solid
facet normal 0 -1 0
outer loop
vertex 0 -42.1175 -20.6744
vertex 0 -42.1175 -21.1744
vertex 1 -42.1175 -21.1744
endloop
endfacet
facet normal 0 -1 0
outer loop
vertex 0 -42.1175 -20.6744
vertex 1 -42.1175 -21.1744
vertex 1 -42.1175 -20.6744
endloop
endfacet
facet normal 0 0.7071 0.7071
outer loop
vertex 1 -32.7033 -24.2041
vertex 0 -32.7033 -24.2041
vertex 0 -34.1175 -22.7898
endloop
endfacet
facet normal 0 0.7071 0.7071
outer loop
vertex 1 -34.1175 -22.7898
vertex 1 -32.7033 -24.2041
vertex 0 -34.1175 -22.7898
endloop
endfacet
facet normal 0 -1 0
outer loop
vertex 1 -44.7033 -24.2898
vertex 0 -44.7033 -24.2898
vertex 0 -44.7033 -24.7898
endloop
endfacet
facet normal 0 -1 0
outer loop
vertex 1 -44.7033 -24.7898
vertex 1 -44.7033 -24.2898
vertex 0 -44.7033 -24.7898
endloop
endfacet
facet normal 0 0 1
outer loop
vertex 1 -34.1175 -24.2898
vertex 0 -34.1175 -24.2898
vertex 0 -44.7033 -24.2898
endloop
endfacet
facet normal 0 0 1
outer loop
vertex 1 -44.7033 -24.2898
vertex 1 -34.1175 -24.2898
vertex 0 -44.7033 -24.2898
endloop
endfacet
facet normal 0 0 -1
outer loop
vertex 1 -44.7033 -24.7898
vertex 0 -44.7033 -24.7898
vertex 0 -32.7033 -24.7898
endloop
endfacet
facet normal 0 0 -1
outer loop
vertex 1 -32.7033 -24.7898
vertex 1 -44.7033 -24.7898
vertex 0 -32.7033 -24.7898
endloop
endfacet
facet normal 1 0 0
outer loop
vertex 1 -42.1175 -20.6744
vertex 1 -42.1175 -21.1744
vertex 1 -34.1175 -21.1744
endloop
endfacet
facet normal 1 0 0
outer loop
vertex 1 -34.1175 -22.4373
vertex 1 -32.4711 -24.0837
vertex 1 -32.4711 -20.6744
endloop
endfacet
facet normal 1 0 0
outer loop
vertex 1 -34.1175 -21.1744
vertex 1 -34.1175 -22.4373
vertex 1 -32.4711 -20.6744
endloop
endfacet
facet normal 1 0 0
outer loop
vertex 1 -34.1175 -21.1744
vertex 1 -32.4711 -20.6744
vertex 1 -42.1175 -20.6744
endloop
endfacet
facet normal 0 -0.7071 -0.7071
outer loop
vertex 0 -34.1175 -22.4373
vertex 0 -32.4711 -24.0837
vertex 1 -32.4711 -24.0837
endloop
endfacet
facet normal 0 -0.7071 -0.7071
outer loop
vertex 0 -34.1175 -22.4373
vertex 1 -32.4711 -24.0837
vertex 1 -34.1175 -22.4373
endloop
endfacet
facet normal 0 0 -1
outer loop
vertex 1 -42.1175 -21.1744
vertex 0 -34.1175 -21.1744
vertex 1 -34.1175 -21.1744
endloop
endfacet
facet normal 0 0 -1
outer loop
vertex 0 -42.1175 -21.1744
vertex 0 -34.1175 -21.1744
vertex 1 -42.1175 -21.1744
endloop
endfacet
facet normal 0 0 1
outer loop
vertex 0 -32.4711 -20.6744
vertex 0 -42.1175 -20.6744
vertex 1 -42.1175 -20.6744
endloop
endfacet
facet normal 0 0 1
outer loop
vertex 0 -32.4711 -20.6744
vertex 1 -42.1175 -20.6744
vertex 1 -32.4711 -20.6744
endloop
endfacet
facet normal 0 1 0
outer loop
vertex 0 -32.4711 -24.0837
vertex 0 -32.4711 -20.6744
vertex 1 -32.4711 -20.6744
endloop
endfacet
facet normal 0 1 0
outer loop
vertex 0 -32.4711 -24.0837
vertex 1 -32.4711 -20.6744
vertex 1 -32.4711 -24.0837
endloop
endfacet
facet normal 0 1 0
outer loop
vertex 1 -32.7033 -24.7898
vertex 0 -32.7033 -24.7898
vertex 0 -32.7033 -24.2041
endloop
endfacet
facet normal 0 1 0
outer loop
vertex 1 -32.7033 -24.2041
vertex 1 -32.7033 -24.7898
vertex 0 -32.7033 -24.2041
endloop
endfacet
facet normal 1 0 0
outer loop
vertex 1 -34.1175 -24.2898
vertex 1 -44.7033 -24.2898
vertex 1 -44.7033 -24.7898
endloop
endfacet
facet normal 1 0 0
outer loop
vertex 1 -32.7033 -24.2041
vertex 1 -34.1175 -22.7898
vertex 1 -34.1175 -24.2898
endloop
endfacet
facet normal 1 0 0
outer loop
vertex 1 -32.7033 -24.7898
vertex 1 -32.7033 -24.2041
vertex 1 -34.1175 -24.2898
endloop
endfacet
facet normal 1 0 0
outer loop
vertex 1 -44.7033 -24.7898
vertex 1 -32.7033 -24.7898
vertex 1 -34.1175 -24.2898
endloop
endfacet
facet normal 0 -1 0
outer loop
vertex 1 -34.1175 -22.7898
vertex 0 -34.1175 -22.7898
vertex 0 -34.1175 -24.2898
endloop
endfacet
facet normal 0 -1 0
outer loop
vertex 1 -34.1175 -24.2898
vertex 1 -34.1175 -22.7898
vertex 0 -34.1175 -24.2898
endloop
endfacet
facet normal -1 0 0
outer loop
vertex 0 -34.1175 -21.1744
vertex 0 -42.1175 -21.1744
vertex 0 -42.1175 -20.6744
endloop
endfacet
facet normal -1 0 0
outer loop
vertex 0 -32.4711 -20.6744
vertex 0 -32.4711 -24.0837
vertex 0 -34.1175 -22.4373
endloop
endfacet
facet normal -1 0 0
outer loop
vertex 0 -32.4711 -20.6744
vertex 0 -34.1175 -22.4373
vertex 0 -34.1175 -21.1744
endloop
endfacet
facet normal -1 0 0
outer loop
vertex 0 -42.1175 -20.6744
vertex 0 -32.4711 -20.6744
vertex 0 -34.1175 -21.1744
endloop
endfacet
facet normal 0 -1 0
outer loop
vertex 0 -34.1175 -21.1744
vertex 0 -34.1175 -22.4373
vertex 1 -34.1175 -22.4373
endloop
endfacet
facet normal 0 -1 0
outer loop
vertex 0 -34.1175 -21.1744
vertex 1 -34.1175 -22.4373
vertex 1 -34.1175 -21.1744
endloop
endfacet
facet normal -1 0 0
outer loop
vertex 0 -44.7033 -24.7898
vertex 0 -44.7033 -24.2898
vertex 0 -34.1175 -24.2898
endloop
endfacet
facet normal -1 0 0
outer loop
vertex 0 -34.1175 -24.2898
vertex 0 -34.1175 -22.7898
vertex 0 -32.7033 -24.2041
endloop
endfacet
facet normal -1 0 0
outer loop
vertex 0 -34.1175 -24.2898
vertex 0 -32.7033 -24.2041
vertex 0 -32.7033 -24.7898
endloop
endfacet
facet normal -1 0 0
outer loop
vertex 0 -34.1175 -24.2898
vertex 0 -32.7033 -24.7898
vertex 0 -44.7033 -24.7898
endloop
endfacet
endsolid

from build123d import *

# Parameters (mm, degrees)
BOSS_EXTRUDE1_DEPTH   = 1
BOSS_EXTRUDE1_2_DEPTH = 1


with BuildPart() as part:
    # Sketch2 → Boss-Extrude1 (new body)
    with BuildSketch(Plane(origin=(0, 0, 0), x_dir=(0, 0, -1), z_dir=(1, 0, 0))):
        Polygon((24.20405768, -32.703304917), (22.789844117, -34.117518479), (24.289844117, -34.117518479), (24.289844117, -44.703304917), (24.789844117, -44.703304917), (24.789844117, -32.703304917), align=None)
    extrude(amount=BOSS_EXTRUDE1_DEPTH)


with BuildPart() as body_2:
    # Sketch2 → Boss-Extrude1 2 (new body)
    with BuildSketch(Plane(origin=(0, 0, 0), x_dir=(0, 0, -1), z_dir=(1, 0, 0))):
        Polygon((24.083729902, -32.471116669), (22.437328092, -34.117518479), (21.174371168, -34.117518479), (21.174371168, -42.117518479), (20.674371168, -42.117518479), (20.674371168, -32.471116669), align=None)
    extrude(amount=BOSS_EXTRUDE1_2_DEPTH)


solid = Compound([part.part, body_2.part])
